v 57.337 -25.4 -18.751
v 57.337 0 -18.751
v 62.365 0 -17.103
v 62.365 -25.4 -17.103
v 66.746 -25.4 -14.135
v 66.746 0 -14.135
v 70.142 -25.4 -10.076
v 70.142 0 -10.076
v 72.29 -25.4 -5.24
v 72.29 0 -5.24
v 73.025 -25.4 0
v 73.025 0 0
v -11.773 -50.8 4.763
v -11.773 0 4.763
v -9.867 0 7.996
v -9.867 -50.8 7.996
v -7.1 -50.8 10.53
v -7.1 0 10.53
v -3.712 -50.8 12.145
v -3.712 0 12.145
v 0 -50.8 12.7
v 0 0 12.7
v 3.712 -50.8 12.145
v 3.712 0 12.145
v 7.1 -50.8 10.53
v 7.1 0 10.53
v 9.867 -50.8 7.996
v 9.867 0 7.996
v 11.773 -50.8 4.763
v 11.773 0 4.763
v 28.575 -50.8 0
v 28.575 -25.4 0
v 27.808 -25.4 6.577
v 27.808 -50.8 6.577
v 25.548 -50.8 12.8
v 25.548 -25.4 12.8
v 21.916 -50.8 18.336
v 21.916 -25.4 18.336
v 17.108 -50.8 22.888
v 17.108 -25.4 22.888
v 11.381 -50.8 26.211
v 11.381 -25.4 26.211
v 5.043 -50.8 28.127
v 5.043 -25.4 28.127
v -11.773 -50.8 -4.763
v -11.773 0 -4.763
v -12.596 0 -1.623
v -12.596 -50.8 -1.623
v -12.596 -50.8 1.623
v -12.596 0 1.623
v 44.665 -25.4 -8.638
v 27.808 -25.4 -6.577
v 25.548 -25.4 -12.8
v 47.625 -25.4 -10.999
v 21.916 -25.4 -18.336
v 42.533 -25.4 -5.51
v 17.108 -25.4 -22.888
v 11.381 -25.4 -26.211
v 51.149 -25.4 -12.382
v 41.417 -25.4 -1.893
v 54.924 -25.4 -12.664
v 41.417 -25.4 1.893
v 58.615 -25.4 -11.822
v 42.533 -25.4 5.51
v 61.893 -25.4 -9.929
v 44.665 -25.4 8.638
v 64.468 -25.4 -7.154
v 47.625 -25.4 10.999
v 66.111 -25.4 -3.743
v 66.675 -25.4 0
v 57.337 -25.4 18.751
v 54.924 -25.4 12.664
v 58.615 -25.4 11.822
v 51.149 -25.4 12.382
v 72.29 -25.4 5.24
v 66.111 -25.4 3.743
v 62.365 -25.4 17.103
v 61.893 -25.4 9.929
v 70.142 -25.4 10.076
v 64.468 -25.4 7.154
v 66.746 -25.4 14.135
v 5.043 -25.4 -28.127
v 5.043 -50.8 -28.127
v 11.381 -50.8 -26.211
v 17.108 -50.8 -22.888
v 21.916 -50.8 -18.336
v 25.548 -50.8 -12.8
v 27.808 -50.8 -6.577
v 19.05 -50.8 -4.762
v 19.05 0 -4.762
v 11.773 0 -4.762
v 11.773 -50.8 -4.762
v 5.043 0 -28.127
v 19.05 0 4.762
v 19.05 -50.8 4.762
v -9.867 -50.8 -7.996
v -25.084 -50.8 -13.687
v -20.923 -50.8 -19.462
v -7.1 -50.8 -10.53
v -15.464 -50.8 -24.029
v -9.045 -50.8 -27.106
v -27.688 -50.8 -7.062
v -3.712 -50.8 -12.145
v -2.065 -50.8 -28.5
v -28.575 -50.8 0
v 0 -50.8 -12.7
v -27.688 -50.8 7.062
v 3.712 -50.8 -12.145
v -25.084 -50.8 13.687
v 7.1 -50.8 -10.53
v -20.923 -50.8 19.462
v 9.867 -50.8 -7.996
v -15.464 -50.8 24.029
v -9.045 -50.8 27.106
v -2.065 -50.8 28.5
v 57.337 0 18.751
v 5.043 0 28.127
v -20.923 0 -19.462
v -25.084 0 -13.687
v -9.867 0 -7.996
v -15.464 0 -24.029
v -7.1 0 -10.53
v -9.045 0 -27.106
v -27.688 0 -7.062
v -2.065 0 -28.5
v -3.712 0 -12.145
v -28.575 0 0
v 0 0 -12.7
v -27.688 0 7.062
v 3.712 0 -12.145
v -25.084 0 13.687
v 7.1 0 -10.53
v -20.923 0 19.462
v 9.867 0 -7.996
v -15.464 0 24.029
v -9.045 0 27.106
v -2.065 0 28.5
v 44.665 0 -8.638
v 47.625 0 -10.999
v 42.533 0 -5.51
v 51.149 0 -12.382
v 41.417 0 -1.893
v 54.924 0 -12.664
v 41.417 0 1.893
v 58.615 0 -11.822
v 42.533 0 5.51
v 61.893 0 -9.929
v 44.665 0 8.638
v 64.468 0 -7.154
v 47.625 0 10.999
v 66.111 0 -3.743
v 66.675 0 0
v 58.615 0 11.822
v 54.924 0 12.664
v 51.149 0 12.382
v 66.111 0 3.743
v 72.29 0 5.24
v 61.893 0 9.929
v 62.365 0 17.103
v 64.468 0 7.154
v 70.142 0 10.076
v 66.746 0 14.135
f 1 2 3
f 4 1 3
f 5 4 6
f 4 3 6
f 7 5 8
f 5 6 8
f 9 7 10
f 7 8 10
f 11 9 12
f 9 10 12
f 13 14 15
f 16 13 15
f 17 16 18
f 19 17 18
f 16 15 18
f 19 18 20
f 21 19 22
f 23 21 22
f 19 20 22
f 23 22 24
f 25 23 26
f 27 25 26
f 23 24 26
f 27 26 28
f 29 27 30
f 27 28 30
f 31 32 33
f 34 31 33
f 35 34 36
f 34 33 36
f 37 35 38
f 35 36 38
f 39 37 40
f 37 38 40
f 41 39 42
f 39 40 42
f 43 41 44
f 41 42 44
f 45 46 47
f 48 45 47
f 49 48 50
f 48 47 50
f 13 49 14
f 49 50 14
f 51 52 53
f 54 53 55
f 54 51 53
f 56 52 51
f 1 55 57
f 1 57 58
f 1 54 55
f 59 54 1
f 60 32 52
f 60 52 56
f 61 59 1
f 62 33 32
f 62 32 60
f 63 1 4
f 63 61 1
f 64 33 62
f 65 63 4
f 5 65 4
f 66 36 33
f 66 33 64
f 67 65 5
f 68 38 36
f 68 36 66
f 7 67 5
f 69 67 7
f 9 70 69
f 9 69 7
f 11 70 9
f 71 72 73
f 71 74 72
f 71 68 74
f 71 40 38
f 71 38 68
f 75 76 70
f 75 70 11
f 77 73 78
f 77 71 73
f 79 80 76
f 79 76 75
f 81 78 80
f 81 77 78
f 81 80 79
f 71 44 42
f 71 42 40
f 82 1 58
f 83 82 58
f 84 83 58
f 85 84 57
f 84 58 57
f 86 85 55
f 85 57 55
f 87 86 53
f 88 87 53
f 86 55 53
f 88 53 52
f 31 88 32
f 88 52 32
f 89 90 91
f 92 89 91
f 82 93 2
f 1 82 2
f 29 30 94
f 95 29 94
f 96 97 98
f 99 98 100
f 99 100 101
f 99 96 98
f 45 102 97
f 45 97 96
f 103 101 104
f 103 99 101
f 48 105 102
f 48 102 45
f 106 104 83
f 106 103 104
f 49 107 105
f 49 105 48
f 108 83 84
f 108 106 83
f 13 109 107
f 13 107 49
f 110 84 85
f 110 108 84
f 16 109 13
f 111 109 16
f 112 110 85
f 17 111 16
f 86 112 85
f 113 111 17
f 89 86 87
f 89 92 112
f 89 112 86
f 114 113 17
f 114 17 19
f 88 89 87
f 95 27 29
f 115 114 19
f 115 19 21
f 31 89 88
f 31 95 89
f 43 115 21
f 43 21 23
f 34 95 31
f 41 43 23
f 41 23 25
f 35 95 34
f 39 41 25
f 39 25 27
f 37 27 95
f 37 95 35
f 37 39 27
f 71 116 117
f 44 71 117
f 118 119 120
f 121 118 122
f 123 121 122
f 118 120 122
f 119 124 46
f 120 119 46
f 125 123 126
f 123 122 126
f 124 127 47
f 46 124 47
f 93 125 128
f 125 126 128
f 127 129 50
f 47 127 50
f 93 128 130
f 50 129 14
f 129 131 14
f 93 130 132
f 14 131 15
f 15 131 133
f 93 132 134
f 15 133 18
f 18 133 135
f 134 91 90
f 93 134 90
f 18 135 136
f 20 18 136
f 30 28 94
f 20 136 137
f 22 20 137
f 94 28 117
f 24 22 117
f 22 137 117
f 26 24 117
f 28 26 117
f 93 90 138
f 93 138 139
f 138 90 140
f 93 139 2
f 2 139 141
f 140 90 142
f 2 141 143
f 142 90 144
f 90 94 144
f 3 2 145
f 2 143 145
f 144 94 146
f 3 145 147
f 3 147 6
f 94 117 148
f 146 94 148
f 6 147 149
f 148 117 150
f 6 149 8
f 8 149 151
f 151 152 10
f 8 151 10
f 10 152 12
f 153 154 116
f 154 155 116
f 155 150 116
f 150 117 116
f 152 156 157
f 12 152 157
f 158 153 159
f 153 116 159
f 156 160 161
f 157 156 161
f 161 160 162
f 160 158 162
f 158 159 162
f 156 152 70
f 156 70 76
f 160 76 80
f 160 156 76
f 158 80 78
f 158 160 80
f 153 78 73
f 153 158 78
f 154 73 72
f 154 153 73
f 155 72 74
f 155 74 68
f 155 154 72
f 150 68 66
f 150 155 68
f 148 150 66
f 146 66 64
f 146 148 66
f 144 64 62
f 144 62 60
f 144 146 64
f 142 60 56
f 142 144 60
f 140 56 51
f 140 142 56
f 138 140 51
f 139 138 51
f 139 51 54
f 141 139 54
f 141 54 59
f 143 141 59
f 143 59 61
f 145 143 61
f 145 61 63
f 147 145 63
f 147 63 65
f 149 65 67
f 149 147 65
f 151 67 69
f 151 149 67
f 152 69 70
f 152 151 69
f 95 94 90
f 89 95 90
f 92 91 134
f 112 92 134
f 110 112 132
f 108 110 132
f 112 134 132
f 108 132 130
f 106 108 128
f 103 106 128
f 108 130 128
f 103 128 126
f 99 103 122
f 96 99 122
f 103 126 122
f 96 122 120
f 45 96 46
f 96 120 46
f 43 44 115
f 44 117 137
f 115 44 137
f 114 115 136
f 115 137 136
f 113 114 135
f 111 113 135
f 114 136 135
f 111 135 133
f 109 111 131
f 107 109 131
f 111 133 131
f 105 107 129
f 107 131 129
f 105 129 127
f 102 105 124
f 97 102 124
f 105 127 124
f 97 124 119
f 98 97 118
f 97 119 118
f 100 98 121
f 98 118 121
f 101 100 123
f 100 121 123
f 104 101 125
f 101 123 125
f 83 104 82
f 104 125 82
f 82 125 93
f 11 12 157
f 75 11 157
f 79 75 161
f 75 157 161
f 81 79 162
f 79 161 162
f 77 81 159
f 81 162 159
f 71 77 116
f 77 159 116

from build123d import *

# Parameters (mm, degrees)
F0_R     = 12.7
F1_DEPTH = 25.4
F2_DEPTH = 50.8


with BuildPart() as f1:
    # F0 (on Front) → F1 (new body)
    with BuildSketch(Plane.XZ):
        with BuildLine():
            ThreePointArc((5.042647, -28.126541), (21.916025, -18.336262), (28.575, 0))
            ThreePointArc((28.575, 0), (21.916025, 18.336262), (5.042647, 28.126541))
            ThreePointArc((5.042647, 28.126541), (-28.575, 0), (5.042647, -28.126541))
        make_face()
        with BuildLine():
            ThreePointArc((-11.773215, 4.7625), (0, 12.7), (11.773215, 4.7625))
            Line((11.773215, 4.7625), (19.05, 4.7625))
            Line((19.05, 4.7625), (19.05, -4.7625))
            Line((19.05, -4.7625), (11.773215, -4.7625))
            ThreePointArc((11.773215, -4.7625), (0, -12.7), (-11.773215, -4.7625))
            Line((-11.773215, -4.7625), (-19.05, -4.7625))
            Line((-19.05, -4.7625), (-19.05, 4.7625))
            Line((-19.05, 4.7625), (-11.773215, 4.7625))
        make_face(mode=Mode.SUBTRACT)
        with BuildLine():
            ThreePointArc((-11.773215, -4.7625), (-12.7, 0), (-11.773215, 4.7625))
            Line((-11.773215, 4.7625), (-19.05, 4.7625))
            Line((-19.05, 4.7625), (-19.05, -4.7625))
            Line((-19.05, -4.7625), (-11.773215, -4.7625))
        make_face()
        with BuildLine():
            ThreePointArc((73.025, 0), (68.585683, 12.224174), (57.336765, 18.751028))
            ThreePointArc((57.336765, 18.751028), (34.925, 0), (57.336765, -18.751028))
            ThreePointArc((57.336765, -18.751028), (68.585683, -12.224174), (73.025, 0))
        make_face()
        with Locations((53.975, 0)):
            Circle(F0_R, mode=Mode.SUBTRACT)
        with BuildLine():
            ThreePointArc((5.042647, 28.126541), (21.916025, 18.336262), (28.575, 0))
            ThreePointArc((28.575, 0), (21.916025, -18.336262), (5.042647, -28.126541))
            Line((5.042647, -28.126541), (57.336765, -18.751028))
            ThreePointArc((57.336765, -18.751028), (34.925, 0), (57.336765, 18.751028))
            Line((57.336765, 18.751028), (5.042647, 28.126541))
        make_face()
    extrude(amount=F1_DEPTH)

    # F0 (on Front) → F2 (join)
    with BuildSketch(Plane.XZ):
        with BuildLine():
            ThreePointArc((5.042647, -28.126541), (21.916025, -18.336262), (28.575, 0))
            ThreePointArc((28.575, 0), (21.916025, 18.336262), (5.042647, 28.126541))
            ThreePointArc((5.042647, 28.126541), (-28.575, 0), (5.042647, -28.126541))
        make_face()
        with BuildLine():
            ThreePointArc((-11.773215, 4.7625), (0, 12.7), (11.773215, 4.7625))
            Line((11.773215, 4.7625), (19.05, 4.7625))
            Line((19.05, 4.7625), (19.05, -4.7625))
            Line((19.05, -4.7625), (11.773215, -4.7625))
            ThreePointArc((11.773215, -4.7625), (0, -12.7), (-11.773215, -4.7625))
            Line((-11.773215, -4.7625), (-19.05, -4.7625))
            Line((-19.05, -4.7625), (-19.05, 4.7625))
            Line((-19.05, 4.7625), (-11.773215, 4.7625))
        make_face(mode=Mode.SUBTRACT)
        with BuildLine():
            ThreePointArc((-11.773215, -4.7625), (-12.7, 0), (-11.773215, 4.7625))
            Line((-11.773215, 4.7625), (-19.05, 4.7625))
            Line((-19.05, 4.7625), (-19.05, -4.7625))
            Line((-19.05, -4.7625), (-11.773215, -4.7625))
        make_face()
    extrude(amount=F2_DEPTH)


solid = f1.part
